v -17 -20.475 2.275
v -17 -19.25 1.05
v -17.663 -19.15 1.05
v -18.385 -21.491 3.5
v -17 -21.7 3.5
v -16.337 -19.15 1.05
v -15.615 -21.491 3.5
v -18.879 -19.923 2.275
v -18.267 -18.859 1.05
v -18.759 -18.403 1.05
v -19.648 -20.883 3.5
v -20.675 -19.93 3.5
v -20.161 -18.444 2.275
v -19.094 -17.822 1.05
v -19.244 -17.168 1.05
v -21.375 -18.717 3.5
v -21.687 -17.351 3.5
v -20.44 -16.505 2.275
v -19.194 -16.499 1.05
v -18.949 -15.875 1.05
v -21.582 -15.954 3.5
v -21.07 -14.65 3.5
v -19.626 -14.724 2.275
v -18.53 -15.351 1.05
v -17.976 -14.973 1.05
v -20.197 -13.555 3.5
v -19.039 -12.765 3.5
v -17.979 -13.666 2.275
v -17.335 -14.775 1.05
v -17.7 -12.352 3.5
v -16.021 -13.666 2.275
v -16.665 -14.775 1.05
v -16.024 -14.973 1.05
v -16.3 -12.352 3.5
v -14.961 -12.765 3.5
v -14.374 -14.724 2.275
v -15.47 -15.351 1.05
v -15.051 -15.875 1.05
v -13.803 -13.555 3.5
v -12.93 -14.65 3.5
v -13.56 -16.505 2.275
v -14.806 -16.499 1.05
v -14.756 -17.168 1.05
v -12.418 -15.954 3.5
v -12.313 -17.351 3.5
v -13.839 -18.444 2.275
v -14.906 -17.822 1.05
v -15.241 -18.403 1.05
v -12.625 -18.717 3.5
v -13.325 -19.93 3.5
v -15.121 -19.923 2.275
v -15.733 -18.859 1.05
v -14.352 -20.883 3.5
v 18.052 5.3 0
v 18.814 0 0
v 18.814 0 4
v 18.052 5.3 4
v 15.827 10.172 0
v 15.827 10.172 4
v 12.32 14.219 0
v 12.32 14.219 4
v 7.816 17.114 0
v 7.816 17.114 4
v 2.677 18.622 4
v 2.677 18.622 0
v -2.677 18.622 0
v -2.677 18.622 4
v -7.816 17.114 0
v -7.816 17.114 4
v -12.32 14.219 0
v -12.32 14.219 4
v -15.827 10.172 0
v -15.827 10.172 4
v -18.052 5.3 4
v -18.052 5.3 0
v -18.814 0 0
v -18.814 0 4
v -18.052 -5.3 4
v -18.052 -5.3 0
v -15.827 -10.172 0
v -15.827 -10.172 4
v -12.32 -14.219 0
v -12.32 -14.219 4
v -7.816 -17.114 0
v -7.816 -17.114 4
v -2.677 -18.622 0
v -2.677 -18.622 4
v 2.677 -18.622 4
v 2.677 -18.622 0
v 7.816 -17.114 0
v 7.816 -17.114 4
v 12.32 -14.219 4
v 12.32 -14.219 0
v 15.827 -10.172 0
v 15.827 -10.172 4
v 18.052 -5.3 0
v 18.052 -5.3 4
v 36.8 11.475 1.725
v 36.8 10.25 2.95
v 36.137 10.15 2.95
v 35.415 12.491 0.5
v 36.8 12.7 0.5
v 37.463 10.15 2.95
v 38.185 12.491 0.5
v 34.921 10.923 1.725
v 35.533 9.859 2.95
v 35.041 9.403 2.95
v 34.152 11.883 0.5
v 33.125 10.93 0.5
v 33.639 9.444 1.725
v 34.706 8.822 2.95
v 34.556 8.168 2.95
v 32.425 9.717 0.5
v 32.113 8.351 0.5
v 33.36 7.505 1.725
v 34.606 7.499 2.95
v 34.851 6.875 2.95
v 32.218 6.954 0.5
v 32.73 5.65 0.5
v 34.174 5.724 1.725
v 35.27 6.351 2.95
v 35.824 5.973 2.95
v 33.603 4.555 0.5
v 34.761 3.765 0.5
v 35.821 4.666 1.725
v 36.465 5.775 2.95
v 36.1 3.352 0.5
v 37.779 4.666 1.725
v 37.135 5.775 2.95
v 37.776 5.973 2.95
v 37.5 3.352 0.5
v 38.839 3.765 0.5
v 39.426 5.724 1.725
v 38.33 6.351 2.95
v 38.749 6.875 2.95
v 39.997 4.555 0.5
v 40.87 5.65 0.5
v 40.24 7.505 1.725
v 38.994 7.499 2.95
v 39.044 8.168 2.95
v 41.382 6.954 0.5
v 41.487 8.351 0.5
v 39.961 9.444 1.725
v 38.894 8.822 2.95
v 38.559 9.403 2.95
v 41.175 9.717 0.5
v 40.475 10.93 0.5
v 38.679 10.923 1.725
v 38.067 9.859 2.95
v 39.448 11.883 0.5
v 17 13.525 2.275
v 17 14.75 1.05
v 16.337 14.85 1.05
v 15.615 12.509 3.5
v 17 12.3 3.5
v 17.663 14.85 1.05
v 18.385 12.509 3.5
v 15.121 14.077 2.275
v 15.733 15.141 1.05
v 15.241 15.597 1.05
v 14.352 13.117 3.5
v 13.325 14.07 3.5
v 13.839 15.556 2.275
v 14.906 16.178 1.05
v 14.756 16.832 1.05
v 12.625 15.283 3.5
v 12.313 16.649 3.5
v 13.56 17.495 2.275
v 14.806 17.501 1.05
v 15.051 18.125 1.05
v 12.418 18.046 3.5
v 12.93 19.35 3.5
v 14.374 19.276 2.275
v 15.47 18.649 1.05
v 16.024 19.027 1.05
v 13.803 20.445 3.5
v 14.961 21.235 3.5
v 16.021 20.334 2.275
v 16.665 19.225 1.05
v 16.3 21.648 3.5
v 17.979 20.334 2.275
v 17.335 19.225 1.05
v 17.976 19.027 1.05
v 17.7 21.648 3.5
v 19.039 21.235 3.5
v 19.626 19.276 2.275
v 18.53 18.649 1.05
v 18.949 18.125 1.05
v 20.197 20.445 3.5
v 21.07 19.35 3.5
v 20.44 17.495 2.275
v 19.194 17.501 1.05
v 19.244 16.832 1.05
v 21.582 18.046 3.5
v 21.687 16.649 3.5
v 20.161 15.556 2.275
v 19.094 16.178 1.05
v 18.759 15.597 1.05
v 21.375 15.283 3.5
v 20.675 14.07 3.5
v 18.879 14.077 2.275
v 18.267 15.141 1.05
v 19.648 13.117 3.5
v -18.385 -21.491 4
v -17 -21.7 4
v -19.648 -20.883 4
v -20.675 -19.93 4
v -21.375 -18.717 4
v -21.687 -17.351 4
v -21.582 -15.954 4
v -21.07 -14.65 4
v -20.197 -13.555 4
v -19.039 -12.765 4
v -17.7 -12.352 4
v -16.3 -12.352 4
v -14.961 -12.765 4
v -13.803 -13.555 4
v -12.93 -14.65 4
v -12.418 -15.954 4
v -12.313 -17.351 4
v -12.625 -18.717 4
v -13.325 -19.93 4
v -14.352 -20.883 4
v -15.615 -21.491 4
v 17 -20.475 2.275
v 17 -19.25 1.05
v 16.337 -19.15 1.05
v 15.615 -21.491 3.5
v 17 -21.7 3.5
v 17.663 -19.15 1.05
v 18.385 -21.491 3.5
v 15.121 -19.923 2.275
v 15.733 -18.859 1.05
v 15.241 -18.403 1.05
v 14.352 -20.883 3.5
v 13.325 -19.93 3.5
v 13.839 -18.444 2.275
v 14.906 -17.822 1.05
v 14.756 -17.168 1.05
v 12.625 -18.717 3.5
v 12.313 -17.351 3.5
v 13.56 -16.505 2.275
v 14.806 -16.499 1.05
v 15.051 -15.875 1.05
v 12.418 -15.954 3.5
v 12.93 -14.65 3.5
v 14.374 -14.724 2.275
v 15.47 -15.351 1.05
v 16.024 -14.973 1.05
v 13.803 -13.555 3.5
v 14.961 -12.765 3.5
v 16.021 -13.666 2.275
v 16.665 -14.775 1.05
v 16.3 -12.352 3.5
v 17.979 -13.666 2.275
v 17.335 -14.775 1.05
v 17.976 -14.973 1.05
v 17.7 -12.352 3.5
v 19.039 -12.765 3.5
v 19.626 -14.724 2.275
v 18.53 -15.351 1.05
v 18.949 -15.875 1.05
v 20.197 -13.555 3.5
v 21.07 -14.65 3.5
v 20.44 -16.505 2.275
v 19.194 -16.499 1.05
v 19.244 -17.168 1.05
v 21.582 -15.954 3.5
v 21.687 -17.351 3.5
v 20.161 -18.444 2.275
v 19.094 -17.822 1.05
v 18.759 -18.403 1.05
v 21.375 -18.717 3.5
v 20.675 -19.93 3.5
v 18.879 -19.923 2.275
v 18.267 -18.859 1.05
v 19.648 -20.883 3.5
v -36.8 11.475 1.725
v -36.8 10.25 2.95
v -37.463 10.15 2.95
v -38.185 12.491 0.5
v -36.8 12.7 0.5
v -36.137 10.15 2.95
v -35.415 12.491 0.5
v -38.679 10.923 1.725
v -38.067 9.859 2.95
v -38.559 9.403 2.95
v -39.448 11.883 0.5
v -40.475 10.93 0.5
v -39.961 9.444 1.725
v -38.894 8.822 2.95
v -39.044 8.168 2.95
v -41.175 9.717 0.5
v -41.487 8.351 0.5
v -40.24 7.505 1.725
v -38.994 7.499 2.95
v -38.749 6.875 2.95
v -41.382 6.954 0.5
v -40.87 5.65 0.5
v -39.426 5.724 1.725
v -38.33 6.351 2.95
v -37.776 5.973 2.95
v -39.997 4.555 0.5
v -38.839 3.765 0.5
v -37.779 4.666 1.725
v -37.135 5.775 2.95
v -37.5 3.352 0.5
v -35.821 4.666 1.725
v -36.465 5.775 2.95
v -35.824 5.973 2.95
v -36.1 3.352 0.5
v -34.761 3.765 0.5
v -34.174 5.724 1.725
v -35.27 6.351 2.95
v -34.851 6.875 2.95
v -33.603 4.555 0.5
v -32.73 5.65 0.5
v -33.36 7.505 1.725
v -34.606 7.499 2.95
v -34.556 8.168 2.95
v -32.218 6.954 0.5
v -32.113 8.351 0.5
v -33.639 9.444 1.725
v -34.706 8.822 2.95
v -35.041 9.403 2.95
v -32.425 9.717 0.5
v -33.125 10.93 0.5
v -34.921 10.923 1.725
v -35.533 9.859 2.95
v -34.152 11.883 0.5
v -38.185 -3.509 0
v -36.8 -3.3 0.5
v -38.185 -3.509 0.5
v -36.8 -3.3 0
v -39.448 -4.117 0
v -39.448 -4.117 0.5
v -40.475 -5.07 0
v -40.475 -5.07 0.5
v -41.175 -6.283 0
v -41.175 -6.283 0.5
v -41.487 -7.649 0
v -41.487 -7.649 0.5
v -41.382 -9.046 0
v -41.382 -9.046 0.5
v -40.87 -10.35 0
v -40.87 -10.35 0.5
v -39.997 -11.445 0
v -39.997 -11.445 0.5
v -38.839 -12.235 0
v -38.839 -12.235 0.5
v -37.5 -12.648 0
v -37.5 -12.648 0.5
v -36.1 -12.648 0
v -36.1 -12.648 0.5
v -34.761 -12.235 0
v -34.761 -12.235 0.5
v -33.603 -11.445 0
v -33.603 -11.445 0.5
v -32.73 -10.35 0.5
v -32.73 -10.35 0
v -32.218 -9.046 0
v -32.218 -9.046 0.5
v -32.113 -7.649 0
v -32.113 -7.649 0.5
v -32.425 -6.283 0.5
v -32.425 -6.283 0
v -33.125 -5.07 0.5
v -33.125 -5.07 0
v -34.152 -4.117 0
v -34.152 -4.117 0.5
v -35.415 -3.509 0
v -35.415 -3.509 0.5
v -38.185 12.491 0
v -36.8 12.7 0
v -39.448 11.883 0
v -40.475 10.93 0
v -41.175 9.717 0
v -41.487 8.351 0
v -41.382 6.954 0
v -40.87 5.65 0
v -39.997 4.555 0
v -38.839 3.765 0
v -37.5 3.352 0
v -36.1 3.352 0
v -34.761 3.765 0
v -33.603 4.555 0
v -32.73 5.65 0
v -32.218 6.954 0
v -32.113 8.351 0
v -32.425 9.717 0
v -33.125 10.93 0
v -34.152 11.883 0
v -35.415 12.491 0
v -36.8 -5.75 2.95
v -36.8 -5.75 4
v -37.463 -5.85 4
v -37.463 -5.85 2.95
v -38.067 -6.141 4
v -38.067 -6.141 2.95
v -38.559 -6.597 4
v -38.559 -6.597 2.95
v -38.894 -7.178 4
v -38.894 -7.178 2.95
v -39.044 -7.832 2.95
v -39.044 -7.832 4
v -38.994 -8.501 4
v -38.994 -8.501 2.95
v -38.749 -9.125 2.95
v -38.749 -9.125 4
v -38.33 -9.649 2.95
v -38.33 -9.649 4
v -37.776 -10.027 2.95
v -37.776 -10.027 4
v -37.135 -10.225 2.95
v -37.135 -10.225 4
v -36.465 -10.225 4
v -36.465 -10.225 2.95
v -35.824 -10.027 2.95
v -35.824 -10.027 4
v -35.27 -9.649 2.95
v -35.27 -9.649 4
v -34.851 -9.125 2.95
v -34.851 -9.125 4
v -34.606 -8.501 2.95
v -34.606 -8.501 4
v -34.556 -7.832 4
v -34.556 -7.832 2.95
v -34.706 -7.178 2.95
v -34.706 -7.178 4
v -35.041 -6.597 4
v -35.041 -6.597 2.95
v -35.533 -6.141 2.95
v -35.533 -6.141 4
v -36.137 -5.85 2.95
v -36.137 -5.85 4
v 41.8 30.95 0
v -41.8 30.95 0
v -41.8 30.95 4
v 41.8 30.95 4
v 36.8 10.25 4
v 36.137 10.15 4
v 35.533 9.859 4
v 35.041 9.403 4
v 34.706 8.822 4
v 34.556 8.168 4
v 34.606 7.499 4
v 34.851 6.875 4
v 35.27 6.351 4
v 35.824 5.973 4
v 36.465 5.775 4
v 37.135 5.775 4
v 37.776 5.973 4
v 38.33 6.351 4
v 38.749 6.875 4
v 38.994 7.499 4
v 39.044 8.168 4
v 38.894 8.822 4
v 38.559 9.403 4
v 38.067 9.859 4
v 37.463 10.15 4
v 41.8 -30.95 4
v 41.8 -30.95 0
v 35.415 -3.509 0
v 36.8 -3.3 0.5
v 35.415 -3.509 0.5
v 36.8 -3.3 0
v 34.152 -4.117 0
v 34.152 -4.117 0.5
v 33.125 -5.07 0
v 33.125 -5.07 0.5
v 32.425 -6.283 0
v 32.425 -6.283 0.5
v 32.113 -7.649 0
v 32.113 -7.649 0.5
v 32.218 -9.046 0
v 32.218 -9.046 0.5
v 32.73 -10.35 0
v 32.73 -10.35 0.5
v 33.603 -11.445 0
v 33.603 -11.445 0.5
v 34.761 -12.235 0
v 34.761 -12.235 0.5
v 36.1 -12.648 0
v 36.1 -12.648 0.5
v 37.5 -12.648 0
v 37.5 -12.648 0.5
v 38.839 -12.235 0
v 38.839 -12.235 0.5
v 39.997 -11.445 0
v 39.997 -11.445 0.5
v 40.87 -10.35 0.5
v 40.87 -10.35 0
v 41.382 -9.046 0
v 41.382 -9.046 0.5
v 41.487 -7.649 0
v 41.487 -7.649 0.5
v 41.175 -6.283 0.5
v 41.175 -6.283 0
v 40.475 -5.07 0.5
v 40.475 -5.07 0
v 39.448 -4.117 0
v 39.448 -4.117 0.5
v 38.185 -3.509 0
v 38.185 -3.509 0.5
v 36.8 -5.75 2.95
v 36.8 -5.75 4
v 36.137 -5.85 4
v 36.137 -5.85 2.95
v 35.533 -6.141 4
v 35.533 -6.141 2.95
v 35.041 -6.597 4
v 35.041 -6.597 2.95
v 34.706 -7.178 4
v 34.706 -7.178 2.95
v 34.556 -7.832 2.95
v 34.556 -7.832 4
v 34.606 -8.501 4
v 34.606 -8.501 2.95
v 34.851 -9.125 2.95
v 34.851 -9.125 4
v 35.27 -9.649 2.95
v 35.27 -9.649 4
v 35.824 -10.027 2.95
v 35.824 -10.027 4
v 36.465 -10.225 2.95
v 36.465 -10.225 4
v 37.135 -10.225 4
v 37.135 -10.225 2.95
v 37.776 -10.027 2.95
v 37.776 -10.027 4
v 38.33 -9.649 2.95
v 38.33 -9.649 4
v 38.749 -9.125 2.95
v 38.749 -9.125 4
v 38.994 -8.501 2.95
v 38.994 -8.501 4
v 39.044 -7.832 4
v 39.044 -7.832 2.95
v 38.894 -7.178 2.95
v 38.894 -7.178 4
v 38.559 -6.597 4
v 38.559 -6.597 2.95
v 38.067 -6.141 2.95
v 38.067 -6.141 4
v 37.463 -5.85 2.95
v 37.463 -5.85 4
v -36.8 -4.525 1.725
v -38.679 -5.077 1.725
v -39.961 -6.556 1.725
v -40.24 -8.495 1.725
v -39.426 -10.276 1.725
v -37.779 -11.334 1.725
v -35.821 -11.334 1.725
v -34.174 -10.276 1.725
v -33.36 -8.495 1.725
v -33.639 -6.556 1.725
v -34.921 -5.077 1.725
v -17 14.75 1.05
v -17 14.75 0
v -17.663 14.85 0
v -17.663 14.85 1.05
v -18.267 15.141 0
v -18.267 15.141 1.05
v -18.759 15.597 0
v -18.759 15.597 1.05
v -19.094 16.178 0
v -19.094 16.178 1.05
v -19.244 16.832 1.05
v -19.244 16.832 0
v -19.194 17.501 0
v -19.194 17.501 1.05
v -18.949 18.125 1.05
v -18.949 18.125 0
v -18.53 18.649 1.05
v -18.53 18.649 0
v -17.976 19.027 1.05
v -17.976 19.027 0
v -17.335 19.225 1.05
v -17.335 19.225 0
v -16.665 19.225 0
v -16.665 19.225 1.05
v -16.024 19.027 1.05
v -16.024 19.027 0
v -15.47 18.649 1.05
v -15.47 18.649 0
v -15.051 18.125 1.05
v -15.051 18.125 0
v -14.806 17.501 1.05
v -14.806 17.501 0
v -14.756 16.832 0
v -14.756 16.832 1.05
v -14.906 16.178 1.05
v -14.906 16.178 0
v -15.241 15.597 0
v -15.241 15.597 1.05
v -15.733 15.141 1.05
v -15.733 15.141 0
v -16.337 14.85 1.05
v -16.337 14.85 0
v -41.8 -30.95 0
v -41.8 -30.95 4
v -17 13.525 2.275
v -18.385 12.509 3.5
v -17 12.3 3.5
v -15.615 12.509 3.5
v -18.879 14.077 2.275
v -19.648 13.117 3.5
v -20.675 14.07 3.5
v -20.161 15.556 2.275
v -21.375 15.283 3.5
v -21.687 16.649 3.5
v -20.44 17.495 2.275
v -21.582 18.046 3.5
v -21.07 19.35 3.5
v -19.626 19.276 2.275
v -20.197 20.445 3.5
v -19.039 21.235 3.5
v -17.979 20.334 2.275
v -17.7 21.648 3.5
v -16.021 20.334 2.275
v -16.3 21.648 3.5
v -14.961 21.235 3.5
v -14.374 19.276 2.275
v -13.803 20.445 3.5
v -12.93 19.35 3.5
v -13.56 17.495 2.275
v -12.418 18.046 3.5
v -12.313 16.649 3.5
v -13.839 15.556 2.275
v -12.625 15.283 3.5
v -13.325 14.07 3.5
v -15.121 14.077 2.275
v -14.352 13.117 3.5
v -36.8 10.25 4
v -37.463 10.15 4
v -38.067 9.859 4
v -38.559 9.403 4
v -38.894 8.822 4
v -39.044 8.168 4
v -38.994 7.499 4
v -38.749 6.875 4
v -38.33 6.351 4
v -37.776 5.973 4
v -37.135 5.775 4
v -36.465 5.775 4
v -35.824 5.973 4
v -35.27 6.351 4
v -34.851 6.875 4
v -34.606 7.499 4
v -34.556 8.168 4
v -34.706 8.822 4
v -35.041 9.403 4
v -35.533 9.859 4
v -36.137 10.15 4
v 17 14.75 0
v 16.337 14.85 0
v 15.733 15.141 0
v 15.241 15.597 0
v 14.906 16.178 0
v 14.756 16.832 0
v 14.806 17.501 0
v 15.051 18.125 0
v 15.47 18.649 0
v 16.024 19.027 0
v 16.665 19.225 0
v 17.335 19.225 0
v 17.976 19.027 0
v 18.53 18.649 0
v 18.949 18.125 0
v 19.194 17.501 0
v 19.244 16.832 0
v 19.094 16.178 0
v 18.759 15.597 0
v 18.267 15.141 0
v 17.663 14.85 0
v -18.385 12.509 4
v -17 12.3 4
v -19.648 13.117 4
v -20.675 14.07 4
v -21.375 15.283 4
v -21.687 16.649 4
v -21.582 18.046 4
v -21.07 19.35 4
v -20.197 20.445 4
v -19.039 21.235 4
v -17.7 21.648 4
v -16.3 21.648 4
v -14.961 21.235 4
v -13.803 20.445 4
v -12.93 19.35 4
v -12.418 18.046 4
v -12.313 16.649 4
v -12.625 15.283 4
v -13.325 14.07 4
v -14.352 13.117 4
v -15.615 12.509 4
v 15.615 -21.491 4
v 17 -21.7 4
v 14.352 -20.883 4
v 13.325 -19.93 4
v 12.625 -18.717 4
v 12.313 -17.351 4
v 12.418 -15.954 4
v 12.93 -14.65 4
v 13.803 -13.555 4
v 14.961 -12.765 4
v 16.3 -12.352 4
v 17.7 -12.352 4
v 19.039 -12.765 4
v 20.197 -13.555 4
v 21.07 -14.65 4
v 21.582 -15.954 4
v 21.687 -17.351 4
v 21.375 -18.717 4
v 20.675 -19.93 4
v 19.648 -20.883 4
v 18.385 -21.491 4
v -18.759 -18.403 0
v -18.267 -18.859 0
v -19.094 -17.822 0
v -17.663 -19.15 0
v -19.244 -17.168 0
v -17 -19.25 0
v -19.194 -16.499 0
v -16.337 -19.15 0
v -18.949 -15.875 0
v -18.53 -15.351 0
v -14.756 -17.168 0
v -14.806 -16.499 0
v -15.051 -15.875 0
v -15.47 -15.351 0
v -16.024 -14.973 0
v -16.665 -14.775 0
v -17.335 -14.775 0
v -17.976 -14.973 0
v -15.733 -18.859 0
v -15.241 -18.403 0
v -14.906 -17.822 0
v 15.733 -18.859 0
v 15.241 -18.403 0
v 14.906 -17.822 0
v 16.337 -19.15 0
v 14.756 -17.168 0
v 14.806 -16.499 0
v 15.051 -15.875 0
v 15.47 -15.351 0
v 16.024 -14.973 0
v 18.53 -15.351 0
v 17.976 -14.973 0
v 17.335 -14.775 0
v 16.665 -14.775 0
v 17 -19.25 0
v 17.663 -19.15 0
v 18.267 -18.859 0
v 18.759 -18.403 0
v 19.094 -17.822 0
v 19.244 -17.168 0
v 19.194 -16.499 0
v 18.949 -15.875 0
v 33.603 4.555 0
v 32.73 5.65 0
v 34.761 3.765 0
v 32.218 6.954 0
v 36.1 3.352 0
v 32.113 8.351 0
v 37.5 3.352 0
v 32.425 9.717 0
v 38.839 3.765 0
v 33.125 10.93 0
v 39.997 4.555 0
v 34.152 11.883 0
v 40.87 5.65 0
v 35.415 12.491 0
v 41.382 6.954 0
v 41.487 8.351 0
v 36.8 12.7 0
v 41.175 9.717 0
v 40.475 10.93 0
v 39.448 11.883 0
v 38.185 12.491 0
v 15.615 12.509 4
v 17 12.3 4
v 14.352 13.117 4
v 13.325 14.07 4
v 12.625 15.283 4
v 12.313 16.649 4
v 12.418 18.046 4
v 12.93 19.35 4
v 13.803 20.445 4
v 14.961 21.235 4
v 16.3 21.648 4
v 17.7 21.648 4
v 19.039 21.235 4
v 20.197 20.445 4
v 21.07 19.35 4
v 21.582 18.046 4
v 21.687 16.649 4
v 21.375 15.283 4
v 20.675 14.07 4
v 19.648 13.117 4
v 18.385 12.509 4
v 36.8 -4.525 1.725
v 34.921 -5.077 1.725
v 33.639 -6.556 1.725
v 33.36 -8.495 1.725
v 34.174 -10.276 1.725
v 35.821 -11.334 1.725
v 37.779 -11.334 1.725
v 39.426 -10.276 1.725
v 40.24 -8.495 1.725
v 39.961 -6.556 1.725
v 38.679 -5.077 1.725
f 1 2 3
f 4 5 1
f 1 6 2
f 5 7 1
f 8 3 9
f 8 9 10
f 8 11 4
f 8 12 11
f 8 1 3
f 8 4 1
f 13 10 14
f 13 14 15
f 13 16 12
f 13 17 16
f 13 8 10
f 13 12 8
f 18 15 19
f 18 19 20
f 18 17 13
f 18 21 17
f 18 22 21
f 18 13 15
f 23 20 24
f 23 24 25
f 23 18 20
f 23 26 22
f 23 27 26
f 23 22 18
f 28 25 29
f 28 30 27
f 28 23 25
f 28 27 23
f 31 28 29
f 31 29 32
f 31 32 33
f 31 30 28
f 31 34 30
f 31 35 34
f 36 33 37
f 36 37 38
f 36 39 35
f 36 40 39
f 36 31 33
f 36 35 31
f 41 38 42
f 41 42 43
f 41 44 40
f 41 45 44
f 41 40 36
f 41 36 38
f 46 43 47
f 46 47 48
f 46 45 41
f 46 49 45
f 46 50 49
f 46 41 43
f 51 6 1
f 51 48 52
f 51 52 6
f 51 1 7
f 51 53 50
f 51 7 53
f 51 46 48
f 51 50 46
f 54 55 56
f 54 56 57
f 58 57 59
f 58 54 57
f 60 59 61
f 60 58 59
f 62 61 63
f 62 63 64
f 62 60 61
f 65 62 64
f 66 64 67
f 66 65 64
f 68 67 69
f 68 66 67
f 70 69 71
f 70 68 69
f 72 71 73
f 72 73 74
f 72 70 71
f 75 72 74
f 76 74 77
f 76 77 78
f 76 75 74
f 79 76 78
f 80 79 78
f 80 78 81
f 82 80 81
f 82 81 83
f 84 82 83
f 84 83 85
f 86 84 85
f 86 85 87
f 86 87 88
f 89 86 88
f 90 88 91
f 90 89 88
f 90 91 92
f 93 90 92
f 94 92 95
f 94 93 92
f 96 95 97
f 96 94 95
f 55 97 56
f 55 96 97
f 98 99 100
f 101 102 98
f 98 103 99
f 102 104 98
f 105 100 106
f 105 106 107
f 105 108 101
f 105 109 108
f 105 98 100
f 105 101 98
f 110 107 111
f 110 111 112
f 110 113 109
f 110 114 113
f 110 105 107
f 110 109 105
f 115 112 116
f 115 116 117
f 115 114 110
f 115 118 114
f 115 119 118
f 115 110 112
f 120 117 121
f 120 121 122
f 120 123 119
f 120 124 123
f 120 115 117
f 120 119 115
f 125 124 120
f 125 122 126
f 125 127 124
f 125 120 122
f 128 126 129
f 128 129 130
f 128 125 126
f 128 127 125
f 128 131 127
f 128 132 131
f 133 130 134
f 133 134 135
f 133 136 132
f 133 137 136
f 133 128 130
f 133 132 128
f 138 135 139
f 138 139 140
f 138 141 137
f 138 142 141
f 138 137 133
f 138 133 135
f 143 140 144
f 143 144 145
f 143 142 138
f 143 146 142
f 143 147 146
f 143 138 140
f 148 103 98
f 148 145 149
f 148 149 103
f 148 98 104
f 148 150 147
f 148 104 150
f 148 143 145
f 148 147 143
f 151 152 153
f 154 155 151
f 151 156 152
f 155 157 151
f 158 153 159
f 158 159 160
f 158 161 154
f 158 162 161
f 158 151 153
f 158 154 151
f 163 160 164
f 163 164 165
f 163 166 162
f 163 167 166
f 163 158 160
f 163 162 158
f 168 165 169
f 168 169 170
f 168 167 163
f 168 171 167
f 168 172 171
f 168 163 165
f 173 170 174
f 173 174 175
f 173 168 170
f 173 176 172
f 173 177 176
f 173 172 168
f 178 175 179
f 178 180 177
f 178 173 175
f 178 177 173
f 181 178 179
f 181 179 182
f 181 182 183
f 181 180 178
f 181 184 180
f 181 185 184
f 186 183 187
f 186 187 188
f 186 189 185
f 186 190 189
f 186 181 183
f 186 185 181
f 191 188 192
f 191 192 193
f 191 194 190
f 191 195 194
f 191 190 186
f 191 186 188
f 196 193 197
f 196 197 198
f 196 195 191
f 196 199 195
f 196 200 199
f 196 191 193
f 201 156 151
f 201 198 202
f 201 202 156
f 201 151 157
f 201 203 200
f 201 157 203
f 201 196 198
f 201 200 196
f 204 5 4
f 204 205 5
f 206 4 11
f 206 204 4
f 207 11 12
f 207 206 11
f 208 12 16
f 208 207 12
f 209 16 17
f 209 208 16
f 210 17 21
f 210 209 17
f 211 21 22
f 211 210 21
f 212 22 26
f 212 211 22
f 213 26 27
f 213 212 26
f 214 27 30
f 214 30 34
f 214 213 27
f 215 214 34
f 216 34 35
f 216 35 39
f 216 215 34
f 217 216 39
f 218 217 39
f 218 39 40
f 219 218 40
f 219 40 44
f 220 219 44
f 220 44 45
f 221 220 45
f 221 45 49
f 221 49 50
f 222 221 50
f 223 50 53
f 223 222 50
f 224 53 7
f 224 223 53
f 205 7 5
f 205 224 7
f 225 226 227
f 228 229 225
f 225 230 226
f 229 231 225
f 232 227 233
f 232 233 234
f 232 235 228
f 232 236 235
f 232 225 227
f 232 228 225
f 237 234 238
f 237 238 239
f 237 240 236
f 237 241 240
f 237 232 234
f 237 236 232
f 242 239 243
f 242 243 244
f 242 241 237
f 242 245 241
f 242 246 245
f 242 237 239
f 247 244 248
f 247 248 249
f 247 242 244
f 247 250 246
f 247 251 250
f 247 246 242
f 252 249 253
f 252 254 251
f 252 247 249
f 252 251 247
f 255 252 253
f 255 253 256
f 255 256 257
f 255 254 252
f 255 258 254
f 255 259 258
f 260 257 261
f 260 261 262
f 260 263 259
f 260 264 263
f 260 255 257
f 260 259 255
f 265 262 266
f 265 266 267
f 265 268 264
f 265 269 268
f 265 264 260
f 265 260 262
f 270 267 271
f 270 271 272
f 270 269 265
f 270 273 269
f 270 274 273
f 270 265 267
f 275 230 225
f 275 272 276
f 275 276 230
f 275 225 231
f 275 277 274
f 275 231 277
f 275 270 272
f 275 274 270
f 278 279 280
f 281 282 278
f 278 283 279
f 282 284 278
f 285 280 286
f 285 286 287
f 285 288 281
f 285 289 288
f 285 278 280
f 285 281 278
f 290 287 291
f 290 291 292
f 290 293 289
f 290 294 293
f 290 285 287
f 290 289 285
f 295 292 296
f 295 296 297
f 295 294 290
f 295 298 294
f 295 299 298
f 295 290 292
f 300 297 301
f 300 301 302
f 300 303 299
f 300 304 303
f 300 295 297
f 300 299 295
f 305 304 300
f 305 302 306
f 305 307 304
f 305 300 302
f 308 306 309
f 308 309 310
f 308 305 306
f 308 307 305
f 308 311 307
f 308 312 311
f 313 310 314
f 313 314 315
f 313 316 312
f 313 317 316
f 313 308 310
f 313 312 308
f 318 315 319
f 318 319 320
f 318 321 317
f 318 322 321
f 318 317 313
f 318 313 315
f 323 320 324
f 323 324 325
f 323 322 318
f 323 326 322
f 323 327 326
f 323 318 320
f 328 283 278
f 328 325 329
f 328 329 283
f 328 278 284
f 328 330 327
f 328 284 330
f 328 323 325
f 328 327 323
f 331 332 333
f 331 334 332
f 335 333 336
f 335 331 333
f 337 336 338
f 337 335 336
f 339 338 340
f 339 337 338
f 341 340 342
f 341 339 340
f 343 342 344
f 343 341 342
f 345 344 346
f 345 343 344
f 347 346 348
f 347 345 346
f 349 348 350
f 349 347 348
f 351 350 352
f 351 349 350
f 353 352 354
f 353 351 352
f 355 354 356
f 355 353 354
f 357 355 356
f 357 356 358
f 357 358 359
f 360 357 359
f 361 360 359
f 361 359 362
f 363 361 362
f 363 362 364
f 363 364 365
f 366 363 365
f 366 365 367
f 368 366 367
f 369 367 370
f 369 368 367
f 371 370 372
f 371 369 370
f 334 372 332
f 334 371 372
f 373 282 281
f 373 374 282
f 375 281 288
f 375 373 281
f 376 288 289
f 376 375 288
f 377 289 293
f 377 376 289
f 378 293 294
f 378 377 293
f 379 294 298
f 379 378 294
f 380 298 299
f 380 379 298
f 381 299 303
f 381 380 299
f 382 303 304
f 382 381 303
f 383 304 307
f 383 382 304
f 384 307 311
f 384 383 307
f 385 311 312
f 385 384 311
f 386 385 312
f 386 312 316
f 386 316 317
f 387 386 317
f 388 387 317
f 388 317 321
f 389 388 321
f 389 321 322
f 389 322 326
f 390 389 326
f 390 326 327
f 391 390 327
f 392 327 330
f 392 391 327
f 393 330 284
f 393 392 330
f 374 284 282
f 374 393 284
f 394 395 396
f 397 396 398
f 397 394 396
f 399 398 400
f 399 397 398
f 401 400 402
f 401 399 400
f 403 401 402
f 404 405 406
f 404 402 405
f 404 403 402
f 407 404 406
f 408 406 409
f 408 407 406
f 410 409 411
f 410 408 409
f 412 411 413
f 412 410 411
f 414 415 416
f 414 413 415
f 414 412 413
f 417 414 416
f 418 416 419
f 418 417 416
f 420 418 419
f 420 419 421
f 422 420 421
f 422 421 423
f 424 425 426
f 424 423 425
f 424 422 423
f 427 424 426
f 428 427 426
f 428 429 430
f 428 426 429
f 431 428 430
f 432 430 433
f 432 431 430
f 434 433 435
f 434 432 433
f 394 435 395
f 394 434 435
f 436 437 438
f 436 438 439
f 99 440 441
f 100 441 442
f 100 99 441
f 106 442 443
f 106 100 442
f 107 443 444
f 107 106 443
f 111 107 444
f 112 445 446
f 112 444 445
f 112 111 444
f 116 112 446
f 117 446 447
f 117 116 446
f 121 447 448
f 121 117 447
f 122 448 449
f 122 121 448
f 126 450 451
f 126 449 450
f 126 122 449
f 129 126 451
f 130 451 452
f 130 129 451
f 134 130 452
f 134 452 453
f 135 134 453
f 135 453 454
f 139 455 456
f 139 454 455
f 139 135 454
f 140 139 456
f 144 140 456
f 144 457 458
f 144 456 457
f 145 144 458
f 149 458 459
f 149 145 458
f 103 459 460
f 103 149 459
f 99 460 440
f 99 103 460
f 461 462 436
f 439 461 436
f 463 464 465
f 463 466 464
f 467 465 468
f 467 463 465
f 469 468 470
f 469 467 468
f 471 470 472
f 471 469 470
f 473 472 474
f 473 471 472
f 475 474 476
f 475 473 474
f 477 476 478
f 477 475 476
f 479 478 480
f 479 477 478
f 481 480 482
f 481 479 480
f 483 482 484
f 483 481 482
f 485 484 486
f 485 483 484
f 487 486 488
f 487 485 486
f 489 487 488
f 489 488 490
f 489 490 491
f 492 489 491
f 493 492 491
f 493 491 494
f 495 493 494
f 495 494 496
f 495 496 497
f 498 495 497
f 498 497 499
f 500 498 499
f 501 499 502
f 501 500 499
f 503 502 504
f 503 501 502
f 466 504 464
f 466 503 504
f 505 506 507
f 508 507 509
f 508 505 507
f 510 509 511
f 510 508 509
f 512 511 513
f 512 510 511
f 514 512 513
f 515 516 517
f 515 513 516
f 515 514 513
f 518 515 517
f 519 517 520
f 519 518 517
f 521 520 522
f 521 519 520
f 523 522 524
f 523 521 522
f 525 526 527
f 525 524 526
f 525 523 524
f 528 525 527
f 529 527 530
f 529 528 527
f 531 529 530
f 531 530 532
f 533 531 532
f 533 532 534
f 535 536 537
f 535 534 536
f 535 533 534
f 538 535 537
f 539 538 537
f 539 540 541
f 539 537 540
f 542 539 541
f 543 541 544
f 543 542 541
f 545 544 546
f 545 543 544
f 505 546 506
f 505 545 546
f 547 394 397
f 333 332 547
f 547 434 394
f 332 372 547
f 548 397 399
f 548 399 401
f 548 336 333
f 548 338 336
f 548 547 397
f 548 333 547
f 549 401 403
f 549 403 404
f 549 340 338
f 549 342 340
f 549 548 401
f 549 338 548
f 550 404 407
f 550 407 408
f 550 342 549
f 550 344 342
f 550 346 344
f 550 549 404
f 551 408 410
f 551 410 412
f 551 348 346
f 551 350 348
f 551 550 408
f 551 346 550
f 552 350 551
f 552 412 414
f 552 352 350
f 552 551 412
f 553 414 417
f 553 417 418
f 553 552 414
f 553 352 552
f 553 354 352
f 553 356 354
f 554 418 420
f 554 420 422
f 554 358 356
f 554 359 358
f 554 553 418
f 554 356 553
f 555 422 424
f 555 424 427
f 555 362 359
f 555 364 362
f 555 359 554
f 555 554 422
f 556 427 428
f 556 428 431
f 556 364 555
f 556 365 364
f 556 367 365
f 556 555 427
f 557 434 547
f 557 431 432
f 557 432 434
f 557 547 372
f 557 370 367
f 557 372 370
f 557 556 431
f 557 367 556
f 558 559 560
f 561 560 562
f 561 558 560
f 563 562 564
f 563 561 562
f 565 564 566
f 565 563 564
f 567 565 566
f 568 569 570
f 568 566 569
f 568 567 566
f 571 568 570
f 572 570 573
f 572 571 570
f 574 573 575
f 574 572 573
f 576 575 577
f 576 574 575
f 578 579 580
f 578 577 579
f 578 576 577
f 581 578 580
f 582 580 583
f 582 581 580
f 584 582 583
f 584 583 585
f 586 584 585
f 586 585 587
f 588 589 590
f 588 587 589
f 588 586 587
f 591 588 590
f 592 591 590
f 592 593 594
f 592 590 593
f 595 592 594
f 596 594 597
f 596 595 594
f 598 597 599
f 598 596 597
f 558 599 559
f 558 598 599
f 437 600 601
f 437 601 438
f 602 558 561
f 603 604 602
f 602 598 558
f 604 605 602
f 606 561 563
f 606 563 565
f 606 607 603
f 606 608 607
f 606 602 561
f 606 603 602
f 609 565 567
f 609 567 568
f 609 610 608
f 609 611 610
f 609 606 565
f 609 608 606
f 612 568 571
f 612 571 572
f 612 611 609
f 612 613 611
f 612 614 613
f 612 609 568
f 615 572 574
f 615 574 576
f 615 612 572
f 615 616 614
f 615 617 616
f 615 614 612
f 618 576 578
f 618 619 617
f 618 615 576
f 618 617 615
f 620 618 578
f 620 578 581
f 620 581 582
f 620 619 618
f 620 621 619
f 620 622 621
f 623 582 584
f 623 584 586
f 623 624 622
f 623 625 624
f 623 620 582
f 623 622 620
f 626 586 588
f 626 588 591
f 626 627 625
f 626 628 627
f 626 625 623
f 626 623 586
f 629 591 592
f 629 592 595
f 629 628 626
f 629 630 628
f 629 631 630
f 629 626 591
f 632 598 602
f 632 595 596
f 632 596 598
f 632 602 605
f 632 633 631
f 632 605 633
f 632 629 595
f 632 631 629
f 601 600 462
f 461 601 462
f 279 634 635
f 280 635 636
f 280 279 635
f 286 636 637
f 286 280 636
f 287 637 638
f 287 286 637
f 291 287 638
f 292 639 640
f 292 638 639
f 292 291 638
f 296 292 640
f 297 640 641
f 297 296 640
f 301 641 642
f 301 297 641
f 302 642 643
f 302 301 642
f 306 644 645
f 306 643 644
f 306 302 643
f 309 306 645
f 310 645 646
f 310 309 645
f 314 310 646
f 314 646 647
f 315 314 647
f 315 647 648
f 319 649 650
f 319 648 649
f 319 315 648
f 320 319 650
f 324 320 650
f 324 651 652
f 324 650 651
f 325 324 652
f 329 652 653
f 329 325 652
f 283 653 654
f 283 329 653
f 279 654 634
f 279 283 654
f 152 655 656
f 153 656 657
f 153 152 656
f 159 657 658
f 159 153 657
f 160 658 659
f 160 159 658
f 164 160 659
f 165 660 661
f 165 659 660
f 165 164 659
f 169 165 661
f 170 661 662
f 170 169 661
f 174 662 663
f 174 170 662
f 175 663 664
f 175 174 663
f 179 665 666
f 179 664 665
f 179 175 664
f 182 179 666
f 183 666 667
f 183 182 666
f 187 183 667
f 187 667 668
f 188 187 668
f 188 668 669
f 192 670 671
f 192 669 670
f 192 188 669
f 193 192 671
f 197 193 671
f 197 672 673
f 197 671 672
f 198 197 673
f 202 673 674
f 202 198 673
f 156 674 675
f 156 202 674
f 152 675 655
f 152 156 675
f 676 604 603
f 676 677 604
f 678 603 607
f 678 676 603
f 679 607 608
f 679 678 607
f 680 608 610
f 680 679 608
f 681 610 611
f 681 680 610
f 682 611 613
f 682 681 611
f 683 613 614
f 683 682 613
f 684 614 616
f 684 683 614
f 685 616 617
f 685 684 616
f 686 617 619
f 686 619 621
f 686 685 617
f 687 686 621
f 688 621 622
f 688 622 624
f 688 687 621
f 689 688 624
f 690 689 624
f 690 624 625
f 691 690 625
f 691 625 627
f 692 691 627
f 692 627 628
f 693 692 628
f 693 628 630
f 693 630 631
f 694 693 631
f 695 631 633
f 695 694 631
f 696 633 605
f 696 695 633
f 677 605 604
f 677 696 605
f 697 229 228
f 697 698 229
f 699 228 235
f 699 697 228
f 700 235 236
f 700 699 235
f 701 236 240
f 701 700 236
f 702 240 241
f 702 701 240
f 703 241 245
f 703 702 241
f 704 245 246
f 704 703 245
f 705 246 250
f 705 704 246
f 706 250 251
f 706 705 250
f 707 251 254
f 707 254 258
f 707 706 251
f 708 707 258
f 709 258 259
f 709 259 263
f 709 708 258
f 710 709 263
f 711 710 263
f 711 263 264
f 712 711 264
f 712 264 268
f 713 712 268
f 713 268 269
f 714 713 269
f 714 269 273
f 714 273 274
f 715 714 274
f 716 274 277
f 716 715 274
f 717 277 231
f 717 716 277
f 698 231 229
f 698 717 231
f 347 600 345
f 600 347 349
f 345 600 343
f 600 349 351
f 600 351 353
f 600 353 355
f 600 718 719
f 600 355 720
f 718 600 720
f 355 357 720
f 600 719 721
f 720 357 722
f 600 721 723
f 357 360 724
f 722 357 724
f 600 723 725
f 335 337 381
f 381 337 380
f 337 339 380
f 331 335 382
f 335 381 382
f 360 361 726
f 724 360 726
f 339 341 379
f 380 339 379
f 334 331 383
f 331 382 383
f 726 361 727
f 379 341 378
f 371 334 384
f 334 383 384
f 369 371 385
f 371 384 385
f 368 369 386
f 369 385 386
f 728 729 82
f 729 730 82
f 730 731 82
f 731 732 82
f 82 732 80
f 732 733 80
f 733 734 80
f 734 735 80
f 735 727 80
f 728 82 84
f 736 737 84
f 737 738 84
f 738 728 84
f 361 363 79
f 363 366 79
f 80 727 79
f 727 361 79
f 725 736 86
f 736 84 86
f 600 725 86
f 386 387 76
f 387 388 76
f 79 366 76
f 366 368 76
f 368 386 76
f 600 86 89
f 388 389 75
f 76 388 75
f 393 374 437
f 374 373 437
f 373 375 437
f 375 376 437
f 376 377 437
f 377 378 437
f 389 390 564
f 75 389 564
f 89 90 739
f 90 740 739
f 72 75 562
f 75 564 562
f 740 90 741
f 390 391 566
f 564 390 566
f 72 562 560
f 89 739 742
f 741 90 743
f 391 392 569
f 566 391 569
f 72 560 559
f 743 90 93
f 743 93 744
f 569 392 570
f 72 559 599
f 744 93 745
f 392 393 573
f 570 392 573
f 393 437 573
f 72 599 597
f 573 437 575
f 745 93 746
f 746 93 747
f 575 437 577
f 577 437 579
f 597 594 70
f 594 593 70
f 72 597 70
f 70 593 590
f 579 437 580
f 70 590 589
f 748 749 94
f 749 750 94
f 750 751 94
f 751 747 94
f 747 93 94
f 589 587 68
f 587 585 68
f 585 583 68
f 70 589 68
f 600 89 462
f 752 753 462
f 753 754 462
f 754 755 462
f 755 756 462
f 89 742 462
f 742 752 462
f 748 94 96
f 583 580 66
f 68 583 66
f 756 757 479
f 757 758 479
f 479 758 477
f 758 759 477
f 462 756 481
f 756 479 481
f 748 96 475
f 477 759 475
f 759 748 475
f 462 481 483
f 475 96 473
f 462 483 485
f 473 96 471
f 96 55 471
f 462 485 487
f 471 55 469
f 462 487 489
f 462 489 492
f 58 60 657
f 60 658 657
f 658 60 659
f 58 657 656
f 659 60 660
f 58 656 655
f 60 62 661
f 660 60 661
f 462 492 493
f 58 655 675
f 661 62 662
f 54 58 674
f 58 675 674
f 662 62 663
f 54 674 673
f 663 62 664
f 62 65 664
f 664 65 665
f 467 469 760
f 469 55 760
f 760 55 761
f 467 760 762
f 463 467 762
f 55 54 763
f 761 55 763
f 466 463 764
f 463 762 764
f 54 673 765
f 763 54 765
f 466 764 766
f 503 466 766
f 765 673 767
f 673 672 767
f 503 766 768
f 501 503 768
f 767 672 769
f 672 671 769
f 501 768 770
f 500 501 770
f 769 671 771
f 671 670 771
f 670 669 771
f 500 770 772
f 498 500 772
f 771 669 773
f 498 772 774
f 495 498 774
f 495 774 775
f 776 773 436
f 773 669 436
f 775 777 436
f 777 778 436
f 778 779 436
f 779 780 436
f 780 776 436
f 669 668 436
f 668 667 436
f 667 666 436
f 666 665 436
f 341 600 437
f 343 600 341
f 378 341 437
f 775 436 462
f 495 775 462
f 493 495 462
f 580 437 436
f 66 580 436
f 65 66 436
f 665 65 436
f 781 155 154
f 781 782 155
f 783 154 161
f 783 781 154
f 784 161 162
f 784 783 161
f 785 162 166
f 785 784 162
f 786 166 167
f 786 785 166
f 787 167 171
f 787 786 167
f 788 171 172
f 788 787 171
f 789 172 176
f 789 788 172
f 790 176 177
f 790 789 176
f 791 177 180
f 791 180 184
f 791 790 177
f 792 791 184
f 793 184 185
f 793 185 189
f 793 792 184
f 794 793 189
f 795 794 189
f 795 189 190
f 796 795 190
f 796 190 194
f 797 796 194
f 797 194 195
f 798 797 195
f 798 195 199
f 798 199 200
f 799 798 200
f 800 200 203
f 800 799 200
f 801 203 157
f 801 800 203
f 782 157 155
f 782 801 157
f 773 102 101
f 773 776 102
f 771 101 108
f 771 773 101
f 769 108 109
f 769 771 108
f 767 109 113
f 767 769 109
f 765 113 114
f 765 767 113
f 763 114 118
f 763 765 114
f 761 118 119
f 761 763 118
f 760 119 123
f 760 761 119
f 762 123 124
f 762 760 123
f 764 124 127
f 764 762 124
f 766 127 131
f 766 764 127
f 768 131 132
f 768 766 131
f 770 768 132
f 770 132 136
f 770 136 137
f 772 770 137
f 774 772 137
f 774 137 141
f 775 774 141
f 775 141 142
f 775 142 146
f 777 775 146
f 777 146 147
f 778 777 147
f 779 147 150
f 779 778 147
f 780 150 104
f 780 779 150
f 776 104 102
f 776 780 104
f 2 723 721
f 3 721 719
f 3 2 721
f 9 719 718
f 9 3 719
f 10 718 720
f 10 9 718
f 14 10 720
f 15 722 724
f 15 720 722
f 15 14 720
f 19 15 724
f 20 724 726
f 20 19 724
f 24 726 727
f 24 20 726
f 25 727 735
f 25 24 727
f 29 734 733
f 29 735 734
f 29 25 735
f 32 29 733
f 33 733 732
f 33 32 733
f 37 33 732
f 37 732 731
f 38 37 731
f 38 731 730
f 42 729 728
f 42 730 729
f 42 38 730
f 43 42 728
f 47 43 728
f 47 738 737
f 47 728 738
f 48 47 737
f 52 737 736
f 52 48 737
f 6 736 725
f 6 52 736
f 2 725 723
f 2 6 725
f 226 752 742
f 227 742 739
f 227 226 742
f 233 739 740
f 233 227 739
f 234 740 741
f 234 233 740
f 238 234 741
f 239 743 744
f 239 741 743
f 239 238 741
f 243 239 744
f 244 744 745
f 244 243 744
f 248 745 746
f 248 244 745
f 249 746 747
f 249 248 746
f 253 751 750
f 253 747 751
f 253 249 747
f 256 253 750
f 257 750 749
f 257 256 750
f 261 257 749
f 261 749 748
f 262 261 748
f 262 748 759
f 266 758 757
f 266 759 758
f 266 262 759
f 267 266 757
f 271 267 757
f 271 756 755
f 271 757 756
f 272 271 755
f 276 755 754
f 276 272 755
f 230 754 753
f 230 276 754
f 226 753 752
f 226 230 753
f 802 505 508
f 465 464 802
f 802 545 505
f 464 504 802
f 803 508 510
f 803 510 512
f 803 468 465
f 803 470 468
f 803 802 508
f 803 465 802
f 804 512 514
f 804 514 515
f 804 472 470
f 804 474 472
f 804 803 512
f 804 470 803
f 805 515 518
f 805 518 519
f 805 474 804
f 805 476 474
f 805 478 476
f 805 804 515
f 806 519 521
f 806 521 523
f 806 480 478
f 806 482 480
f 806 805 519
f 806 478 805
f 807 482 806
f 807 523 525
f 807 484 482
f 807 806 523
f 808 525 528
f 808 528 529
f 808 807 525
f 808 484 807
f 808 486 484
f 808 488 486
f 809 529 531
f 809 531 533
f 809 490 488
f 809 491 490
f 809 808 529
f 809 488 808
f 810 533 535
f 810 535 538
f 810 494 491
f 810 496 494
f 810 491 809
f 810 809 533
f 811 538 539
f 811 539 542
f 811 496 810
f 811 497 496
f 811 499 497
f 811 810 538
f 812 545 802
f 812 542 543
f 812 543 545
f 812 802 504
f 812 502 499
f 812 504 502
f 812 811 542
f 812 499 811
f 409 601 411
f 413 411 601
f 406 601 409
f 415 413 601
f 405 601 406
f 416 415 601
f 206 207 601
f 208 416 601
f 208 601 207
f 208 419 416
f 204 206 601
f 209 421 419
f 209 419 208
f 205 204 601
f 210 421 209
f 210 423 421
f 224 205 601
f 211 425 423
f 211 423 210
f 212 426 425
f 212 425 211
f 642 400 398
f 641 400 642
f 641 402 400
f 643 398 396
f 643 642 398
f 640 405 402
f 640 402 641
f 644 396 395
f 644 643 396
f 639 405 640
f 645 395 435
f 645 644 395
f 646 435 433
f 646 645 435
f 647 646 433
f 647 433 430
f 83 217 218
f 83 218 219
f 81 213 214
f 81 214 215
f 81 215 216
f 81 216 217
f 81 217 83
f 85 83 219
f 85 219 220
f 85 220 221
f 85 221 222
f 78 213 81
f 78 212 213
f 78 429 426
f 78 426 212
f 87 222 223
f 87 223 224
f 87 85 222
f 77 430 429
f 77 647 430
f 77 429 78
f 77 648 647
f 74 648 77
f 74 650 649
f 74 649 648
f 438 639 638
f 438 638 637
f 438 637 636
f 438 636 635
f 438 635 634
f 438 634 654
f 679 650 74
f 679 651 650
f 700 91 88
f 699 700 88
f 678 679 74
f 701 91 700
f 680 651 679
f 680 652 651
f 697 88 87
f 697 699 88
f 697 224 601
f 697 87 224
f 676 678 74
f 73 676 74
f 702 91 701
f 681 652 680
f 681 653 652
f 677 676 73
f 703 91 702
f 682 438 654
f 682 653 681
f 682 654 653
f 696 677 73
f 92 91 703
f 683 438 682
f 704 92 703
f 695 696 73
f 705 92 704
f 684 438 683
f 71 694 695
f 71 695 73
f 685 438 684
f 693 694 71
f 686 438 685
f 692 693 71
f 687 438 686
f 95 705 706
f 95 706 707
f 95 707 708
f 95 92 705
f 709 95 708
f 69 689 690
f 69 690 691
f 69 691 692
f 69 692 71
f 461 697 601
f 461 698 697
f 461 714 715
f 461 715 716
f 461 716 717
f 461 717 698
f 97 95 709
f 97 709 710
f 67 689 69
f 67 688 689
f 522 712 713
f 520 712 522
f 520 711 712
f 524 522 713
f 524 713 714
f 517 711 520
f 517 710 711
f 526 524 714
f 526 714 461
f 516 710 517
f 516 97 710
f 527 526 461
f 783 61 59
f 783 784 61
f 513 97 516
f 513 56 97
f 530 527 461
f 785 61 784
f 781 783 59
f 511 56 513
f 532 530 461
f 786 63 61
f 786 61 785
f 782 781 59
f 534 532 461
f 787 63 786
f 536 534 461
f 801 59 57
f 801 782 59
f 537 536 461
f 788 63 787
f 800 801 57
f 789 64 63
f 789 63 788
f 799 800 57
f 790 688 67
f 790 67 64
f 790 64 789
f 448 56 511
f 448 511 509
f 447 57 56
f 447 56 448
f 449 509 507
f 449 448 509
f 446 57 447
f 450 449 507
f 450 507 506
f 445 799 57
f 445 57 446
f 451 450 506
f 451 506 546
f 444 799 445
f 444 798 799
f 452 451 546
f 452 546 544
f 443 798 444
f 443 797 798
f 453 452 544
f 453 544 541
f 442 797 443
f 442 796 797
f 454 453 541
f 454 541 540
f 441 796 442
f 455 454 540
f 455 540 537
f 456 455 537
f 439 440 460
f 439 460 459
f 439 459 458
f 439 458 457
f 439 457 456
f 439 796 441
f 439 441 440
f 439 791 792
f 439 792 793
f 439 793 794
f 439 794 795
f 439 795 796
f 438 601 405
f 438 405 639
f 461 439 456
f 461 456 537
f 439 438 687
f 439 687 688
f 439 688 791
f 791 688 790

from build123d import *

# Parameters (mm, degrees)
ESQUISSE1_W                                 = 83.6
ESQUISSE1_H                                 = 61.9
ESQUISSE1_R                                 = 18.813799135
BOSS_EXTRU_1_DEPTH                          = 4
FRAISAGE_POUR_VIS_T_TE_FRAIS_E_M41_AT_COUNT = 2
FRAISAGE_POUR_VIS_T_TE_FRAIS_E_M41_AT_PITCH = 34
FRAISAGE_POUR_VIS_T_TE_FRAIS_E_M41_2_COUNT  = 2
FRAISAGE_POUR_VIS_T_TE_FRAIS_E_M41_2_PITCH  = 48.083261121
FRAISAGE_POUR_VIS_T_TE_FRAIS_E_M41_3_COUNT  = 2
FRAISAGE_POUR_VIS_T_TE_FRAIS_E_M41_3_PITCH  = 34
FRAISAGE_POUR_VIS_T_TE_FRAIS_E_M42_AT_COUNT = 2
FRAISAGE_POUR_VIS_T_TE_FRAIS_E_M42_AT_PITCH = 16
FRAISAGE_POUR_VIS_T_TE_FRAIS_E_M42_2_COUNT  = 2
FRAISAGE_POUR_VIS_T_TE_FRAIS_E_M42_2_PITCH  = 75.319054694
FRAISAGE_POUR_VIS_T_TE_FRAIS_E_M42_3_COUNT  = 2
FRAISAGE_POUR_VIS_T_TE_FRAIS_E_M42_3_PITCH  = 73.6


with BuildPart() as part:
    # Esquisse1 → Boss.-Extru.1 (new body)
    with BuildSketch(Plane.XY):
        Rectangle(ESQUISSE1_W, ESQUISSE1_H)
        Circle(ESQUISSE1_R, mode=Mode.SUBTRACT)
    extrude(amount=BOSS_EXTRU_1_DEPTH)

    # Esquisse4 → Fraisage pour vis à tête fraisée M41 (revolve, cut)
    with BuildSketch(Plane(origin=(-17, 17, 4), x_dir=(0, -1, 0), z_dir=(1, 0, 0))):
        Polygon((0, 0), (0, 12.851936393), (2.25, 11.5), (2.25, 2.95), (4.7, 0.5), (4.7, 0), align=None)
    fraisage_pour_vis_t_te_frais_e_m41 = revolve(axis=Axis((-17, 17, 10.35), (0, 0, -1)), mode=Mode.SUBTRACT)

    # Fraisage pour vis à tête fraisée M41 at: Fraisage pour vis à tête fraisée M41 ×2
    with Locations(*[(i * FRAISAGE_POUR_VIS_T_TE_FRAIS_E_M41_AT_PITCH, 0, 0) for i in range(1, FRAISAGE_POUR_VIS_T_TE_FRAIS_E_M41_AT_COUNT)]):
        add(fraisage_pour_vis_t_te_frais_e_m41, mode=Mode.SUBTRACT)

    # Fraisage pour vis _ t_te frais_e M41 2: Fraisage pour vis à tête fraisée M41 ×2
    with Locations(*[Vector(0.7071067811865476, -0.7071067811865475, 0) * (i * FRAISAGE_POUR_VIS_T_TE_FRAIS_E_M41_2_PITCH) for i in range(1, FRAISAGE_POUR_VIS_T_TE_FRAIS_E_M41_2_COUNT)]):
        add(fraisage_pour_vis_t_te_frais_e_m41, mode=Mode.SUBTRACT)

    # Fraisage pour vis _ t_te frais_e M41 3: Fraisage pour vis à tête fraisée M41 ×2
    with Locations(*[(0, -i * FRAISAGE_POUR_VIS_T_TE_FRAIS_E_M41_3_PITCH, 0) for i in range(1, FRAISAGE_POUR_VIS_T_TE_FRAIS_E_M41_3_COUNT)]):
        add(fraisage_pour_vis_t_te_frais_e_m41, mode=Mode.SUBTRACT)

    # Esquisse8 → Fraisage pour vis à tête fraisée M42 (revolve, cut)
    with BuildSketch(Plane(origin=(-36.8, 8, 0), x_dir=(0, 1, 0), z_dir=(1, 0, 0))):
        Polygon((0, 0), (0, 12.851936393), (2.25, 11.5), (2.25, 2.95), (4.7, 0.5), (4.7, 0), align=None)
    fraisage_pour_vis_t_te_frais_e_m42 = revolve(axis=Axis((-36.8, 8, -6.35), (0, 0, 1)), mode=Mode.SUBTRACT)

    # Fraisage pour vis à tête fraisée M42 at: Fraisage pour vis à tête fraisée M42 ×2
    with Locations(*[(0, -i * FRAISAGE_POUR_VIS_T_TE_FRAIS_E_M42_AT_PITCH, 0) for i in range(1, FRAISAGE_POUR_VIS_T_TE_FRAIS_E_M42_AT_COUNT)]):
        add(fraisage_pour_vis_t_te_frais_e_m42, mode=Mode.SUBTRACT)

    # Fraisage pour vis _ t_te frais_e M42 2: Fraisage pour vis à tête fraisée M42 ×2
    with Locations(*[Vector(0.9771763639228009, -0.21242964433104397, 0) * (i * FRAISAGE_POUR_VIS_T_TE_FRAIS_E_M42_2_PITCH) for i in range(1, FRAISAGE_POUR_VIS_T_TE_FRAIS_E_M42_2_COUNT)]):
        add(fraisage_pour_vis_t_te_frais_e_m42, mode=Mode.SUBTRACT)

    # Fraisage pour vis _ t_te frais_e M42 3: Fraisage pour vis à tête fraisée M42 ×2
    with Locations(*[(i * FRAISAGE_POUR_VIS_T_TE_FRAIS_E_M42_3_PITCH, 0, 0) for i in range(1, FRAISAGE_POUR_VIS_T_TE_FRAIS_E_M42_3_COUNT)]):
        add(fraisage_pour_vis_t_te_frais_e_m42, mode=Mode.SUBTRACT)


solid = part.part
